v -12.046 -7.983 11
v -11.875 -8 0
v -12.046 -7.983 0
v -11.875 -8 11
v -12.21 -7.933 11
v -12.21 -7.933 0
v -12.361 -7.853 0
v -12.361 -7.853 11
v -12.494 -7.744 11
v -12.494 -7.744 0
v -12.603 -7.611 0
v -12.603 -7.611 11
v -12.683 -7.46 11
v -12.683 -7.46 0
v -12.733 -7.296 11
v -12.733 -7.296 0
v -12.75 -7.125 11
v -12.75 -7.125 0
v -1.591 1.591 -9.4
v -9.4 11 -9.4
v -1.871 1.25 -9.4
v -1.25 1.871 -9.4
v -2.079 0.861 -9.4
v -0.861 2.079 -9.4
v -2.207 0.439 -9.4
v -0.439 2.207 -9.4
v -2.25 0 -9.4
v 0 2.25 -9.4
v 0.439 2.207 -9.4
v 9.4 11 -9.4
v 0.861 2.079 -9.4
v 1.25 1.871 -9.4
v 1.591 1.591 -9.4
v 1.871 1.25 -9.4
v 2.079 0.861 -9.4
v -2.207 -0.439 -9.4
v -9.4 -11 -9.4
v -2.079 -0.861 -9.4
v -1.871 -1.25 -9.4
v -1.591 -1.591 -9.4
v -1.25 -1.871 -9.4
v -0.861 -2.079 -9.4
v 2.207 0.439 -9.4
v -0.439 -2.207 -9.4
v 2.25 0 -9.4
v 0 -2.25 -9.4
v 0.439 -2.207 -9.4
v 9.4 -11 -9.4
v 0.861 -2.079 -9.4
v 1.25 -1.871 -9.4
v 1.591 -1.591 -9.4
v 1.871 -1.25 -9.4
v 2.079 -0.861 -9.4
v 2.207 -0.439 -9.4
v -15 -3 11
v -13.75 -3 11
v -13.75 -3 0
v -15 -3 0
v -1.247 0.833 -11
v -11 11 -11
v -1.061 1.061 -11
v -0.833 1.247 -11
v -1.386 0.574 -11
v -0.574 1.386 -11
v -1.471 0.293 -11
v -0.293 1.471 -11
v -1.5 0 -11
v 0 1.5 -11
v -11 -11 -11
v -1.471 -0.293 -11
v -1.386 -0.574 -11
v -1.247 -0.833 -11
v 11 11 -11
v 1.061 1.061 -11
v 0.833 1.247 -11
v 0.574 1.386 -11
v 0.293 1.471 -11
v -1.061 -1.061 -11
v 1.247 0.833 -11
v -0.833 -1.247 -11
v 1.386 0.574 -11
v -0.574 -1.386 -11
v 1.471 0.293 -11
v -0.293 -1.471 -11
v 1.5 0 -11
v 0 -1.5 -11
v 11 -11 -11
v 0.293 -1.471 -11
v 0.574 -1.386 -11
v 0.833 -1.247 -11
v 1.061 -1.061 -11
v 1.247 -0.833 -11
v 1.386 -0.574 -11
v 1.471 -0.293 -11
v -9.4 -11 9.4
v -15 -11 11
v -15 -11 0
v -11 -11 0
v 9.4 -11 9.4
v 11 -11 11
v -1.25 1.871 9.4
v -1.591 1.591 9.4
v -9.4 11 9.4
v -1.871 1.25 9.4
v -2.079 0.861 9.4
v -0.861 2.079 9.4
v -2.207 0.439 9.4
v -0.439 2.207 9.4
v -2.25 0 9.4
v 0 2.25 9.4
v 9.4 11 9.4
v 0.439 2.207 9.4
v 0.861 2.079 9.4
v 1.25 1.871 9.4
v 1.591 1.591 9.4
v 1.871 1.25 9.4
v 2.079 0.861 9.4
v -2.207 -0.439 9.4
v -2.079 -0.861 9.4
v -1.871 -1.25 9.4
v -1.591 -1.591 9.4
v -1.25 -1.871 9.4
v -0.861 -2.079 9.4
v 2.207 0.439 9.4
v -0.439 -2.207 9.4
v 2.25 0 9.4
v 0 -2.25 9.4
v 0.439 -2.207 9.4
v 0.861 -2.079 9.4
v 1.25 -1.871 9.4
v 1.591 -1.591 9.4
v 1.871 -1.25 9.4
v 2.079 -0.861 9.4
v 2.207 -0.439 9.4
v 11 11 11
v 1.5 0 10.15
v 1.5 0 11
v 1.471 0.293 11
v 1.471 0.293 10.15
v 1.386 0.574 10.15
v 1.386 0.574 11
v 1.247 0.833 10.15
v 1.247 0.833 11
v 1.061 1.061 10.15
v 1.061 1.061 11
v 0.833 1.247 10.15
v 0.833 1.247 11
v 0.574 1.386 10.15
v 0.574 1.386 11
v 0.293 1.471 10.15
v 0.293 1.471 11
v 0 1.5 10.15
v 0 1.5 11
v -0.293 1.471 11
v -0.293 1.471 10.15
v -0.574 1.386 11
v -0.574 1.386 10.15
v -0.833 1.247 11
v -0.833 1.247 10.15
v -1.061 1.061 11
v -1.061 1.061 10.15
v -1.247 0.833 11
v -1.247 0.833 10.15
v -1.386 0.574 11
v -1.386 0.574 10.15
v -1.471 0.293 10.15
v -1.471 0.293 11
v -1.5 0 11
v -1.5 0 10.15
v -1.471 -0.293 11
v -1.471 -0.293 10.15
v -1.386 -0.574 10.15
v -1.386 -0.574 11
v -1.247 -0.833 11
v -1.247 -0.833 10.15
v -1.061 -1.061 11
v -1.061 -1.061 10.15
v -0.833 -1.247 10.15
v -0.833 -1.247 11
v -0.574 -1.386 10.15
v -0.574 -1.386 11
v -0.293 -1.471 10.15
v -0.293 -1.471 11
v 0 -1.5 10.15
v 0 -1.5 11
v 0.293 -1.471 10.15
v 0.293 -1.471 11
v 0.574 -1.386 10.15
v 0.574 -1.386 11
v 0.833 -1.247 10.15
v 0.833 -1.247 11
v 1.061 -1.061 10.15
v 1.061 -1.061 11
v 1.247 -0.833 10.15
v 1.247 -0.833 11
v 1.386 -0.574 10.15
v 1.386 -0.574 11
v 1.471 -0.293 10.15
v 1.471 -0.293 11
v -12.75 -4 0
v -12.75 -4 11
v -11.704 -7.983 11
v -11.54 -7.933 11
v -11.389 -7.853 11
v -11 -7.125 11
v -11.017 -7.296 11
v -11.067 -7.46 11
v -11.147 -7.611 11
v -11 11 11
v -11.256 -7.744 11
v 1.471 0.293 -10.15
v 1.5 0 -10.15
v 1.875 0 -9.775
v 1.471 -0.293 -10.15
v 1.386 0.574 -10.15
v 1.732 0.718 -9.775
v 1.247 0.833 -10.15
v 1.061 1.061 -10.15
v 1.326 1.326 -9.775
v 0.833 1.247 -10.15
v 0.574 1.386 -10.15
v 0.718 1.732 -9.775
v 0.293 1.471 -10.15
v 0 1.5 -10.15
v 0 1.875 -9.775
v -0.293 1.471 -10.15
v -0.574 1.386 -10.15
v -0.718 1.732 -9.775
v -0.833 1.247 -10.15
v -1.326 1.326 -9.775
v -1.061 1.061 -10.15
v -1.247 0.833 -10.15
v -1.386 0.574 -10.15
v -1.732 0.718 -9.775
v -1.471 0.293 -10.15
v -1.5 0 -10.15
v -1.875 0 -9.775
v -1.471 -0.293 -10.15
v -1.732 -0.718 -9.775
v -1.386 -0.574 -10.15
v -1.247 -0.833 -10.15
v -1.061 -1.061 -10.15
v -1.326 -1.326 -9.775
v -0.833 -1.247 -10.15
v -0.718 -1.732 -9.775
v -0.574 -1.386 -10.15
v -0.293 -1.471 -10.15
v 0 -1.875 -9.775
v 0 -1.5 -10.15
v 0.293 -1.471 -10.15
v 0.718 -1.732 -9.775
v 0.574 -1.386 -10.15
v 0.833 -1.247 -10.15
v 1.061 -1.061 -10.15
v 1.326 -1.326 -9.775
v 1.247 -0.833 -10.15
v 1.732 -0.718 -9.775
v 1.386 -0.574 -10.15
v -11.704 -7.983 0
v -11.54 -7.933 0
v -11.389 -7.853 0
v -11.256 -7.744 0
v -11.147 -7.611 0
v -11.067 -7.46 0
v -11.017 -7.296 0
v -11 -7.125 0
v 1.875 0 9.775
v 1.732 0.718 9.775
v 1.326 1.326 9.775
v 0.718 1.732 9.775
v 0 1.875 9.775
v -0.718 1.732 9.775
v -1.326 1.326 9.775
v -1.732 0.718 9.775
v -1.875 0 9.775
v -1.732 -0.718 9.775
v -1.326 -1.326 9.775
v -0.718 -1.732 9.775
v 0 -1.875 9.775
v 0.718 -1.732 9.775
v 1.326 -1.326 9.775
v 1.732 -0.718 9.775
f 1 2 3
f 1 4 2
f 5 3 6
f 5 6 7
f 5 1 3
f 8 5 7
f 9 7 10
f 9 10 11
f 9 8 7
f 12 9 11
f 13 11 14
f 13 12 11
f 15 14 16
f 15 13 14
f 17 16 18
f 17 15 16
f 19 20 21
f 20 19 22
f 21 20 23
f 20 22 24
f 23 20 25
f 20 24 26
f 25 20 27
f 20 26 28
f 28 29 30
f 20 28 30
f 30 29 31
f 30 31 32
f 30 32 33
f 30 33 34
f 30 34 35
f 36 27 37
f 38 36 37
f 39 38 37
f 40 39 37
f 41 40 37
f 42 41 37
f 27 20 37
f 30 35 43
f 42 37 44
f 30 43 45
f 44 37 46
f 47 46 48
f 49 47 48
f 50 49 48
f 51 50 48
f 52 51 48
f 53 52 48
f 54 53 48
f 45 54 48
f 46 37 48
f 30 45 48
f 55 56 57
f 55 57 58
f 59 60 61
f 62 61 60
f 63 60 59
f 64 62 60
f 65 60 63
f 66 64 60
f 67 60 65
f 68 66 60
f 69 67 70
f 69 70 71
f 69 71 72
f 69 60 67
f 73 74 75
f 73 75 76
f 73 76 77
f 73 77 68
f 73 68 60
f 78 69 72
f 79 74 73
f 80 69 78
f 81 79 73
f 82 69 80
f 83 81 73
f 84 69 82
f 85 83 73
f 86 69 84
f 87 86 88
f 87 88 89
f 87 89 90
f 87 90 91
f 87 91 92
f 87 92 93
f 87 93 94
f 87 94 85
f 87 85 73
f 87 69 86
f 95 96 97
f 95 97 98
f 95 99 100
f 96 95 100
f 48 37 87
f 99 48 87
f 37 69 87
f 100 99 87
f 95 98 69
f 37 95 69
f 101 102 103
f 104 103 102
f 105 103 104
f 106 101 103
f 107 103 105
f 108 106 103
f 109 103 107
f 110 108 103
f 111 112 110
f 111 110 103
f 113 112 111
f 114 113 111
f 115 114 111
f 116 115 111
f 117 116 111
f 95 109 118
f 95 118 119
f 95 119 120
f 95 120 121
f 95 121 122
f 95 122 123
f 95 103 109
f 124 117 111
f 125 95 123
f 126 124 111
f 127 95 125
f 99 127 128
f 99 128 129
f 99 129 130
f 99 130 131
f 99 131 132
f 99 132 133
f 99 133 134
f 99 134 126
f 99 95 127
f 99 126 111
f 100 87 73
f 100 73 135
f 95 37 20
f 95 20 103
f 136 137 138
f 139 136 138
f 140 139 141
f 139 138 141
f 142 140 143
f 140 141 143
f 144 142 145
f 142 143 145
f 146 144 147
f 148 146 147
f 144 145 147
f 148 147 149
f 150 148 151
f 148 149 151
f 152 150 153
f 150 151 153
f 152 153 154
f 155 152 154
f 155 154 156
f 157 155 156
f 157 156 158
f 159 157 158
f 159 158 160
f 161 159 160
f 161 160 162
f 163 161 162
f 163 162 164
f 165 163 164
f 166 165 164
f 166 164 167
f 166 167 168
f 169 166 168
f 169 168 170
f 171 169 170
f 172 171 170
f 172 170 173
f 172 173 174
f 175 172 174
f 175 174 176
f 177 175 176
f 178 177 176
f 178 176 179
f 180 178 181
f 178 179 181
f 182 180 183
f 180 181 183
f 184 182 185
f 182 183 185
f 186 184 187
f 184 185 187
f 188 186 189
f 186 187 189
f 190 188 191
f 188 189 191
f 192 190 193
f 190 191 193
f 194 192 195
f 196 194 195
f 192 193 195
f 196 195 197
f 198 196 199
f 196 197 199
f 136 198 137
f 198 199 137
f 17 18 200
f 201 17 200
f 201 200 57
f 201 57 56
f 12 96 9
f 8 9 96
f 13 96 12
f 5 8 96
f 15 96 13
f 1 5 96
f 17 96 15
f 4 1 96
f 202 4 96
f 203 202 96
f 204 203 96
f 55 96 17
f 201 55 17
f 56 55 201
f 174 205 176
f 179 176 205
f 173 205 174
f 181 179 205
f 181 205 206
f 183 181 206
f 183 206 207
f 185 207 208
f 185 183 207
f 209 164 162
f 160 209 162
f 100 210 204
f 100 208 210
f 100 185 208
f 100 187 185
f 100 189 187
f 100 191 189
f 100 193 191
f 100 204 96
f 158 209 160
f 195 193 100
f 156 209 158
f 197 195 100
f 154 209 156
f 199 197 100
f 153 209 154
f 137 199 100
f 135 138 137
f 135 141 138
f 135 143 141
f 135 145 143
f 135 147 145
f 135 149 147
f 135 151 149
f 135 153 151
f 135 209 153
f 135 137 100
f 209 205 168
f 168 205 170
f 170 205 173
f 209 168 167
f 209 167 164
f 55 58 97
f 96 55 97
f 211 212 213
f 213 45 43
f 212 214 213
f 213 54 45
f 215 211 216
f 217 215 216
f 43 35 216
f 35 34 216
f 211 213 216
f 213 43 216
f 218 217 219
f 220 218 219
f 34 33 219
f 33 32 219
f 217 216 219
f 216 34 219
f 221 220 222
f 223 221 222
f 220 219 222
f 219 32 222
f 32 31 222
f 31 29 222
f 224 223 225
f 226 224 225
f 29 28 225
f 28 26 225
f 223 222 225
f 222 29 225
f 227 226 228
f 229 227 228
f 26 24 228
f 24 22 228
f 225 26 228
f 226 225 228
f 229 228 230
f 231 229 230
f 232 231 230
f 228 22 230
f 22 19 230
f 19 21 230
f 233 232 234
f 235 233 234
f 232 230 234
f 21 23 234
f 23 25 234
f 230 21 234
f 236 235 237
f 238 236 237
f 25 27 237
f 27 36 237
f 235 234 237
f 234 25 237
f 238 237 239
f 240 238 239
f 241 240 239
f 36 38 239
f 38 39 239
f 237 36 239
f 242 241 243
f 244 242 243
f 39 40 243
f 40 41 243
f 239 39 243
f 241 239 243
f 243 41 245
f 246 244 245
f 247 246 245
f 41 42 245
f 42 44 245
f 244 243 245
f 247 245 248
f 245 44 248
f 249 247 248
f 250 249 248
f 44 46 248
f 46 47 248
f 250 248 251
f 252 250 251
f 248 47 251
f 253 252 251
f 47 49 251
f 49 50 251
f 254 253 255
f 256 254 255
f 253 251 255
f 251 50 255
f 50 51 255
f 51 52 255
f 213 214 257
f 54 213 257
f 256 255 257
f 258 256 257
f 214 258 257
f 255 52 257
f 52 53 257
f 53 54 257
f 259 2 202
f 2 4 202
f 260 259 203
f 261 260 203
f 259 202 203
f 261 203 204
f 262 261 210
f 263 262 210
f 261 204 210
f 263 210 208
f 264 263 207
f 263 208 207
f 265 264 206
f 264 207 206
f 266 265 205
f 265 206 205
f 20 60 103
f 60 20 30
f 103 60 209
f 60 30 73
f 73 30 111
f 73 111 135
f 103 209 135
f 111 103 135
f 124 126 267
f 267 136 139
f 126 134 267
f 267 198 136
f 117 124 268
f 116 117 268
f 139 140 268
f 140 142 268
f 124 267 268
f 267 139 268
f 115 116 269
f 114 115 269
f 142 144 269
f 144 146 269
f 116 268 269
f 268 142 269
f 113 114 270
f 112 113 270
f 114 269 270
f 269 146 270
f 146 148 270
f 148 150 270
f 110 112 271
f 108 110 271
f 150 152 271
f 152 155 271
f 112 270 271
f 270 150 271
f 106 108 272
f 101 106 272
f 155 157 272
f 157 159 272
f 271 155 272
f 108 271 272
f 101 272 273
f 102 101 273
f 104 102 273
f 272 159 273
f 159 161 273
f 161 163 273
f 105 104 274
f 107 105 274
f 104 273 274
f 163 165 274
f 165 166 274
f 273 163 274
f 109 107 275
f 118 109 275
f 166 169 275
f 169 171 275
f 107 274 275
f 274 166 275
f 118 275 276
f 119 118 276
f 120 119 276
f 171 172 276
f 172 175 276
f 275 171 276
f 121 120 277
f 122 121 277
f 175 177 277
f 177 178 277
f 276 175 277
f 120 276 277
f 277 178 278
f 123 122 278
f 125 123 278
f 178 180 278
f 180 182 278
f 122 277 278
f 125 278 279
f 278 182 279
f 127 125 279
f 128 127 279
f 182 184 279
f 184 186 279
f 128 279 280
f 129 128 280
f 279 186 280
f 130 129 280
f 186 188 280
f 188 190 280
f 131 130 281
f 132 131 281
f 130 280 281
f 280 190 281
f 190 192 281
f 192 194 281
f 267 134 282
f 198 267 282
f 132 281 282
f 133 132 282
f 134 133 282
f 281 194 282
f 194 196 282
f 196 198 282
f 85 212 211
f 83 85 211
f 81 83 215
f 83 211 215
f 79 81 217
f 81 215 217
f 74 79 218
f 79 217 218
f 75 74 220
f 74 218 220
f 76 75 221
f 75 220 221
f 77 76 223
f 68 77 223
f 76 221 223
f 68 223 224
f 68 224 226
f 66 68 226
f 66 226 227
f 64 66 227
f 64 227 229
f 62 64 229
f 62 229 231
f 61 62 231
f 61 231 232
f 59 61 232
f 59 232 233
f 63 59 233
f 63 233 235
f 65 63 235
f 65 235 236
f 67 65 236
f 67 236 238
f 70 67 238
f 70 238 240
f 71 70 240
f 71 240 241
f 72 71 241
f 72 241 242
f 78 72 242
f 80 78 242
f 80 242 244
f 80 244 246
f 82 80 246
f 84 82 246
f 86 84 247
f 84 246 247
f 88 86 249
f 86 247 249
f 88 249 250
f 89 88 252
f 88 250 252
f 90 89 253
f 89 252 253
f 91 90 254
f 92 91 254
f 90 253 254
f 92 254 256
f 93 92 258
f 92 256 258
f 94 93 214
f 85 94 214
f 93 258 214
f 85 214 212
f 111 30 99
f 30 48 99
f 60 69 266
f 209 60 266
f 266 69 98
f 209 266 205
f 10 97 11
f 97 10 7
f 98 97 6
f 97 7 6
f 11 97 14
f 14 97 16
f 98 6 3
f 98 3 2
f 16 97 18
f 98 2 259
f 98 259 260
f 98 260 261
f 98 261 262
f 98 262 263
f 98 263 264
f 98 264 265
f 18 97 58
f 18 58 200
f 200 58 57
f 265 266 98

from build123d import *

# Parameters (mm, degrees)
F0_W     = 22
F0_H     = 22
F0_W_2   = 18.8
F0_H_2   = 18.8
F1_DEPTH = 11
F2_R     = 1.5
F3_DEPTH = 25
F4_SIZE  = 0.75
F6_DEPTH = 11
F7_R     = 0.87499
F8_SIZE  = 1


# Not quite as in the source:
# - a fillet or chamfer is up to 0.001 mm smaller than in the source, because OpenCascade refuses the exact size


with BuildPart() as f1:
    # F0 (on Front) → F1 (new body, symmetric)
    with BuildSketch(Plane.XZ):
        Rectangle(F0_W, F0_H)
        Rectangle(F0_W_2, F0_H_2, mode=Mode.SUBTRACT)
    extrude(amount=F1_DEPTH, both=True)

    # F2 (on face) → F3 (cut)
    with BuildSketch(Plane.XY.offset(11)):
        Circle(F2_R)
    extrude(amount=-F3_DEPTH, mode=Mode.SUBTRACT)

    # F4
    f4_edges = [f1.edges().sort_by_distance(p)[0] for p in [
        (-1.5, 0, -9.4),
        (-1.5, 0, 9.4),
    ]]
    chamfer(f4_edges, length=F4_SIZE)

    # F5 (on Top) → F6 (join, through all)
    with BuildSketch(Plane.XY):
        Polygon((-12.75, -3), (-15, -3), (-15, -11), (-11, -11), (-11, -8), (-12.75, -8), align=None)
    extrude(amount=F6_DEPTH)

    # F7 (radius 0.875 in the source; OpenCascade refuses exactly that, so slightly less here)
    f7_edges = [f1.edges().sort_by_distance(p)[0] for p in [
        (-12.75, -8, 5.5),
        (-11, -8, 5.5),
    ]]
    fillet(f7_edges, radius=F7_R)

    # F8
    f8_edges = [f1.edges().sort_by_distance(p)[0] for p in [
        (-12.75, -3, 5.5),
    ]]
    chamfer(f8_edges, length=F8_SIZE)


solid = f1.part
